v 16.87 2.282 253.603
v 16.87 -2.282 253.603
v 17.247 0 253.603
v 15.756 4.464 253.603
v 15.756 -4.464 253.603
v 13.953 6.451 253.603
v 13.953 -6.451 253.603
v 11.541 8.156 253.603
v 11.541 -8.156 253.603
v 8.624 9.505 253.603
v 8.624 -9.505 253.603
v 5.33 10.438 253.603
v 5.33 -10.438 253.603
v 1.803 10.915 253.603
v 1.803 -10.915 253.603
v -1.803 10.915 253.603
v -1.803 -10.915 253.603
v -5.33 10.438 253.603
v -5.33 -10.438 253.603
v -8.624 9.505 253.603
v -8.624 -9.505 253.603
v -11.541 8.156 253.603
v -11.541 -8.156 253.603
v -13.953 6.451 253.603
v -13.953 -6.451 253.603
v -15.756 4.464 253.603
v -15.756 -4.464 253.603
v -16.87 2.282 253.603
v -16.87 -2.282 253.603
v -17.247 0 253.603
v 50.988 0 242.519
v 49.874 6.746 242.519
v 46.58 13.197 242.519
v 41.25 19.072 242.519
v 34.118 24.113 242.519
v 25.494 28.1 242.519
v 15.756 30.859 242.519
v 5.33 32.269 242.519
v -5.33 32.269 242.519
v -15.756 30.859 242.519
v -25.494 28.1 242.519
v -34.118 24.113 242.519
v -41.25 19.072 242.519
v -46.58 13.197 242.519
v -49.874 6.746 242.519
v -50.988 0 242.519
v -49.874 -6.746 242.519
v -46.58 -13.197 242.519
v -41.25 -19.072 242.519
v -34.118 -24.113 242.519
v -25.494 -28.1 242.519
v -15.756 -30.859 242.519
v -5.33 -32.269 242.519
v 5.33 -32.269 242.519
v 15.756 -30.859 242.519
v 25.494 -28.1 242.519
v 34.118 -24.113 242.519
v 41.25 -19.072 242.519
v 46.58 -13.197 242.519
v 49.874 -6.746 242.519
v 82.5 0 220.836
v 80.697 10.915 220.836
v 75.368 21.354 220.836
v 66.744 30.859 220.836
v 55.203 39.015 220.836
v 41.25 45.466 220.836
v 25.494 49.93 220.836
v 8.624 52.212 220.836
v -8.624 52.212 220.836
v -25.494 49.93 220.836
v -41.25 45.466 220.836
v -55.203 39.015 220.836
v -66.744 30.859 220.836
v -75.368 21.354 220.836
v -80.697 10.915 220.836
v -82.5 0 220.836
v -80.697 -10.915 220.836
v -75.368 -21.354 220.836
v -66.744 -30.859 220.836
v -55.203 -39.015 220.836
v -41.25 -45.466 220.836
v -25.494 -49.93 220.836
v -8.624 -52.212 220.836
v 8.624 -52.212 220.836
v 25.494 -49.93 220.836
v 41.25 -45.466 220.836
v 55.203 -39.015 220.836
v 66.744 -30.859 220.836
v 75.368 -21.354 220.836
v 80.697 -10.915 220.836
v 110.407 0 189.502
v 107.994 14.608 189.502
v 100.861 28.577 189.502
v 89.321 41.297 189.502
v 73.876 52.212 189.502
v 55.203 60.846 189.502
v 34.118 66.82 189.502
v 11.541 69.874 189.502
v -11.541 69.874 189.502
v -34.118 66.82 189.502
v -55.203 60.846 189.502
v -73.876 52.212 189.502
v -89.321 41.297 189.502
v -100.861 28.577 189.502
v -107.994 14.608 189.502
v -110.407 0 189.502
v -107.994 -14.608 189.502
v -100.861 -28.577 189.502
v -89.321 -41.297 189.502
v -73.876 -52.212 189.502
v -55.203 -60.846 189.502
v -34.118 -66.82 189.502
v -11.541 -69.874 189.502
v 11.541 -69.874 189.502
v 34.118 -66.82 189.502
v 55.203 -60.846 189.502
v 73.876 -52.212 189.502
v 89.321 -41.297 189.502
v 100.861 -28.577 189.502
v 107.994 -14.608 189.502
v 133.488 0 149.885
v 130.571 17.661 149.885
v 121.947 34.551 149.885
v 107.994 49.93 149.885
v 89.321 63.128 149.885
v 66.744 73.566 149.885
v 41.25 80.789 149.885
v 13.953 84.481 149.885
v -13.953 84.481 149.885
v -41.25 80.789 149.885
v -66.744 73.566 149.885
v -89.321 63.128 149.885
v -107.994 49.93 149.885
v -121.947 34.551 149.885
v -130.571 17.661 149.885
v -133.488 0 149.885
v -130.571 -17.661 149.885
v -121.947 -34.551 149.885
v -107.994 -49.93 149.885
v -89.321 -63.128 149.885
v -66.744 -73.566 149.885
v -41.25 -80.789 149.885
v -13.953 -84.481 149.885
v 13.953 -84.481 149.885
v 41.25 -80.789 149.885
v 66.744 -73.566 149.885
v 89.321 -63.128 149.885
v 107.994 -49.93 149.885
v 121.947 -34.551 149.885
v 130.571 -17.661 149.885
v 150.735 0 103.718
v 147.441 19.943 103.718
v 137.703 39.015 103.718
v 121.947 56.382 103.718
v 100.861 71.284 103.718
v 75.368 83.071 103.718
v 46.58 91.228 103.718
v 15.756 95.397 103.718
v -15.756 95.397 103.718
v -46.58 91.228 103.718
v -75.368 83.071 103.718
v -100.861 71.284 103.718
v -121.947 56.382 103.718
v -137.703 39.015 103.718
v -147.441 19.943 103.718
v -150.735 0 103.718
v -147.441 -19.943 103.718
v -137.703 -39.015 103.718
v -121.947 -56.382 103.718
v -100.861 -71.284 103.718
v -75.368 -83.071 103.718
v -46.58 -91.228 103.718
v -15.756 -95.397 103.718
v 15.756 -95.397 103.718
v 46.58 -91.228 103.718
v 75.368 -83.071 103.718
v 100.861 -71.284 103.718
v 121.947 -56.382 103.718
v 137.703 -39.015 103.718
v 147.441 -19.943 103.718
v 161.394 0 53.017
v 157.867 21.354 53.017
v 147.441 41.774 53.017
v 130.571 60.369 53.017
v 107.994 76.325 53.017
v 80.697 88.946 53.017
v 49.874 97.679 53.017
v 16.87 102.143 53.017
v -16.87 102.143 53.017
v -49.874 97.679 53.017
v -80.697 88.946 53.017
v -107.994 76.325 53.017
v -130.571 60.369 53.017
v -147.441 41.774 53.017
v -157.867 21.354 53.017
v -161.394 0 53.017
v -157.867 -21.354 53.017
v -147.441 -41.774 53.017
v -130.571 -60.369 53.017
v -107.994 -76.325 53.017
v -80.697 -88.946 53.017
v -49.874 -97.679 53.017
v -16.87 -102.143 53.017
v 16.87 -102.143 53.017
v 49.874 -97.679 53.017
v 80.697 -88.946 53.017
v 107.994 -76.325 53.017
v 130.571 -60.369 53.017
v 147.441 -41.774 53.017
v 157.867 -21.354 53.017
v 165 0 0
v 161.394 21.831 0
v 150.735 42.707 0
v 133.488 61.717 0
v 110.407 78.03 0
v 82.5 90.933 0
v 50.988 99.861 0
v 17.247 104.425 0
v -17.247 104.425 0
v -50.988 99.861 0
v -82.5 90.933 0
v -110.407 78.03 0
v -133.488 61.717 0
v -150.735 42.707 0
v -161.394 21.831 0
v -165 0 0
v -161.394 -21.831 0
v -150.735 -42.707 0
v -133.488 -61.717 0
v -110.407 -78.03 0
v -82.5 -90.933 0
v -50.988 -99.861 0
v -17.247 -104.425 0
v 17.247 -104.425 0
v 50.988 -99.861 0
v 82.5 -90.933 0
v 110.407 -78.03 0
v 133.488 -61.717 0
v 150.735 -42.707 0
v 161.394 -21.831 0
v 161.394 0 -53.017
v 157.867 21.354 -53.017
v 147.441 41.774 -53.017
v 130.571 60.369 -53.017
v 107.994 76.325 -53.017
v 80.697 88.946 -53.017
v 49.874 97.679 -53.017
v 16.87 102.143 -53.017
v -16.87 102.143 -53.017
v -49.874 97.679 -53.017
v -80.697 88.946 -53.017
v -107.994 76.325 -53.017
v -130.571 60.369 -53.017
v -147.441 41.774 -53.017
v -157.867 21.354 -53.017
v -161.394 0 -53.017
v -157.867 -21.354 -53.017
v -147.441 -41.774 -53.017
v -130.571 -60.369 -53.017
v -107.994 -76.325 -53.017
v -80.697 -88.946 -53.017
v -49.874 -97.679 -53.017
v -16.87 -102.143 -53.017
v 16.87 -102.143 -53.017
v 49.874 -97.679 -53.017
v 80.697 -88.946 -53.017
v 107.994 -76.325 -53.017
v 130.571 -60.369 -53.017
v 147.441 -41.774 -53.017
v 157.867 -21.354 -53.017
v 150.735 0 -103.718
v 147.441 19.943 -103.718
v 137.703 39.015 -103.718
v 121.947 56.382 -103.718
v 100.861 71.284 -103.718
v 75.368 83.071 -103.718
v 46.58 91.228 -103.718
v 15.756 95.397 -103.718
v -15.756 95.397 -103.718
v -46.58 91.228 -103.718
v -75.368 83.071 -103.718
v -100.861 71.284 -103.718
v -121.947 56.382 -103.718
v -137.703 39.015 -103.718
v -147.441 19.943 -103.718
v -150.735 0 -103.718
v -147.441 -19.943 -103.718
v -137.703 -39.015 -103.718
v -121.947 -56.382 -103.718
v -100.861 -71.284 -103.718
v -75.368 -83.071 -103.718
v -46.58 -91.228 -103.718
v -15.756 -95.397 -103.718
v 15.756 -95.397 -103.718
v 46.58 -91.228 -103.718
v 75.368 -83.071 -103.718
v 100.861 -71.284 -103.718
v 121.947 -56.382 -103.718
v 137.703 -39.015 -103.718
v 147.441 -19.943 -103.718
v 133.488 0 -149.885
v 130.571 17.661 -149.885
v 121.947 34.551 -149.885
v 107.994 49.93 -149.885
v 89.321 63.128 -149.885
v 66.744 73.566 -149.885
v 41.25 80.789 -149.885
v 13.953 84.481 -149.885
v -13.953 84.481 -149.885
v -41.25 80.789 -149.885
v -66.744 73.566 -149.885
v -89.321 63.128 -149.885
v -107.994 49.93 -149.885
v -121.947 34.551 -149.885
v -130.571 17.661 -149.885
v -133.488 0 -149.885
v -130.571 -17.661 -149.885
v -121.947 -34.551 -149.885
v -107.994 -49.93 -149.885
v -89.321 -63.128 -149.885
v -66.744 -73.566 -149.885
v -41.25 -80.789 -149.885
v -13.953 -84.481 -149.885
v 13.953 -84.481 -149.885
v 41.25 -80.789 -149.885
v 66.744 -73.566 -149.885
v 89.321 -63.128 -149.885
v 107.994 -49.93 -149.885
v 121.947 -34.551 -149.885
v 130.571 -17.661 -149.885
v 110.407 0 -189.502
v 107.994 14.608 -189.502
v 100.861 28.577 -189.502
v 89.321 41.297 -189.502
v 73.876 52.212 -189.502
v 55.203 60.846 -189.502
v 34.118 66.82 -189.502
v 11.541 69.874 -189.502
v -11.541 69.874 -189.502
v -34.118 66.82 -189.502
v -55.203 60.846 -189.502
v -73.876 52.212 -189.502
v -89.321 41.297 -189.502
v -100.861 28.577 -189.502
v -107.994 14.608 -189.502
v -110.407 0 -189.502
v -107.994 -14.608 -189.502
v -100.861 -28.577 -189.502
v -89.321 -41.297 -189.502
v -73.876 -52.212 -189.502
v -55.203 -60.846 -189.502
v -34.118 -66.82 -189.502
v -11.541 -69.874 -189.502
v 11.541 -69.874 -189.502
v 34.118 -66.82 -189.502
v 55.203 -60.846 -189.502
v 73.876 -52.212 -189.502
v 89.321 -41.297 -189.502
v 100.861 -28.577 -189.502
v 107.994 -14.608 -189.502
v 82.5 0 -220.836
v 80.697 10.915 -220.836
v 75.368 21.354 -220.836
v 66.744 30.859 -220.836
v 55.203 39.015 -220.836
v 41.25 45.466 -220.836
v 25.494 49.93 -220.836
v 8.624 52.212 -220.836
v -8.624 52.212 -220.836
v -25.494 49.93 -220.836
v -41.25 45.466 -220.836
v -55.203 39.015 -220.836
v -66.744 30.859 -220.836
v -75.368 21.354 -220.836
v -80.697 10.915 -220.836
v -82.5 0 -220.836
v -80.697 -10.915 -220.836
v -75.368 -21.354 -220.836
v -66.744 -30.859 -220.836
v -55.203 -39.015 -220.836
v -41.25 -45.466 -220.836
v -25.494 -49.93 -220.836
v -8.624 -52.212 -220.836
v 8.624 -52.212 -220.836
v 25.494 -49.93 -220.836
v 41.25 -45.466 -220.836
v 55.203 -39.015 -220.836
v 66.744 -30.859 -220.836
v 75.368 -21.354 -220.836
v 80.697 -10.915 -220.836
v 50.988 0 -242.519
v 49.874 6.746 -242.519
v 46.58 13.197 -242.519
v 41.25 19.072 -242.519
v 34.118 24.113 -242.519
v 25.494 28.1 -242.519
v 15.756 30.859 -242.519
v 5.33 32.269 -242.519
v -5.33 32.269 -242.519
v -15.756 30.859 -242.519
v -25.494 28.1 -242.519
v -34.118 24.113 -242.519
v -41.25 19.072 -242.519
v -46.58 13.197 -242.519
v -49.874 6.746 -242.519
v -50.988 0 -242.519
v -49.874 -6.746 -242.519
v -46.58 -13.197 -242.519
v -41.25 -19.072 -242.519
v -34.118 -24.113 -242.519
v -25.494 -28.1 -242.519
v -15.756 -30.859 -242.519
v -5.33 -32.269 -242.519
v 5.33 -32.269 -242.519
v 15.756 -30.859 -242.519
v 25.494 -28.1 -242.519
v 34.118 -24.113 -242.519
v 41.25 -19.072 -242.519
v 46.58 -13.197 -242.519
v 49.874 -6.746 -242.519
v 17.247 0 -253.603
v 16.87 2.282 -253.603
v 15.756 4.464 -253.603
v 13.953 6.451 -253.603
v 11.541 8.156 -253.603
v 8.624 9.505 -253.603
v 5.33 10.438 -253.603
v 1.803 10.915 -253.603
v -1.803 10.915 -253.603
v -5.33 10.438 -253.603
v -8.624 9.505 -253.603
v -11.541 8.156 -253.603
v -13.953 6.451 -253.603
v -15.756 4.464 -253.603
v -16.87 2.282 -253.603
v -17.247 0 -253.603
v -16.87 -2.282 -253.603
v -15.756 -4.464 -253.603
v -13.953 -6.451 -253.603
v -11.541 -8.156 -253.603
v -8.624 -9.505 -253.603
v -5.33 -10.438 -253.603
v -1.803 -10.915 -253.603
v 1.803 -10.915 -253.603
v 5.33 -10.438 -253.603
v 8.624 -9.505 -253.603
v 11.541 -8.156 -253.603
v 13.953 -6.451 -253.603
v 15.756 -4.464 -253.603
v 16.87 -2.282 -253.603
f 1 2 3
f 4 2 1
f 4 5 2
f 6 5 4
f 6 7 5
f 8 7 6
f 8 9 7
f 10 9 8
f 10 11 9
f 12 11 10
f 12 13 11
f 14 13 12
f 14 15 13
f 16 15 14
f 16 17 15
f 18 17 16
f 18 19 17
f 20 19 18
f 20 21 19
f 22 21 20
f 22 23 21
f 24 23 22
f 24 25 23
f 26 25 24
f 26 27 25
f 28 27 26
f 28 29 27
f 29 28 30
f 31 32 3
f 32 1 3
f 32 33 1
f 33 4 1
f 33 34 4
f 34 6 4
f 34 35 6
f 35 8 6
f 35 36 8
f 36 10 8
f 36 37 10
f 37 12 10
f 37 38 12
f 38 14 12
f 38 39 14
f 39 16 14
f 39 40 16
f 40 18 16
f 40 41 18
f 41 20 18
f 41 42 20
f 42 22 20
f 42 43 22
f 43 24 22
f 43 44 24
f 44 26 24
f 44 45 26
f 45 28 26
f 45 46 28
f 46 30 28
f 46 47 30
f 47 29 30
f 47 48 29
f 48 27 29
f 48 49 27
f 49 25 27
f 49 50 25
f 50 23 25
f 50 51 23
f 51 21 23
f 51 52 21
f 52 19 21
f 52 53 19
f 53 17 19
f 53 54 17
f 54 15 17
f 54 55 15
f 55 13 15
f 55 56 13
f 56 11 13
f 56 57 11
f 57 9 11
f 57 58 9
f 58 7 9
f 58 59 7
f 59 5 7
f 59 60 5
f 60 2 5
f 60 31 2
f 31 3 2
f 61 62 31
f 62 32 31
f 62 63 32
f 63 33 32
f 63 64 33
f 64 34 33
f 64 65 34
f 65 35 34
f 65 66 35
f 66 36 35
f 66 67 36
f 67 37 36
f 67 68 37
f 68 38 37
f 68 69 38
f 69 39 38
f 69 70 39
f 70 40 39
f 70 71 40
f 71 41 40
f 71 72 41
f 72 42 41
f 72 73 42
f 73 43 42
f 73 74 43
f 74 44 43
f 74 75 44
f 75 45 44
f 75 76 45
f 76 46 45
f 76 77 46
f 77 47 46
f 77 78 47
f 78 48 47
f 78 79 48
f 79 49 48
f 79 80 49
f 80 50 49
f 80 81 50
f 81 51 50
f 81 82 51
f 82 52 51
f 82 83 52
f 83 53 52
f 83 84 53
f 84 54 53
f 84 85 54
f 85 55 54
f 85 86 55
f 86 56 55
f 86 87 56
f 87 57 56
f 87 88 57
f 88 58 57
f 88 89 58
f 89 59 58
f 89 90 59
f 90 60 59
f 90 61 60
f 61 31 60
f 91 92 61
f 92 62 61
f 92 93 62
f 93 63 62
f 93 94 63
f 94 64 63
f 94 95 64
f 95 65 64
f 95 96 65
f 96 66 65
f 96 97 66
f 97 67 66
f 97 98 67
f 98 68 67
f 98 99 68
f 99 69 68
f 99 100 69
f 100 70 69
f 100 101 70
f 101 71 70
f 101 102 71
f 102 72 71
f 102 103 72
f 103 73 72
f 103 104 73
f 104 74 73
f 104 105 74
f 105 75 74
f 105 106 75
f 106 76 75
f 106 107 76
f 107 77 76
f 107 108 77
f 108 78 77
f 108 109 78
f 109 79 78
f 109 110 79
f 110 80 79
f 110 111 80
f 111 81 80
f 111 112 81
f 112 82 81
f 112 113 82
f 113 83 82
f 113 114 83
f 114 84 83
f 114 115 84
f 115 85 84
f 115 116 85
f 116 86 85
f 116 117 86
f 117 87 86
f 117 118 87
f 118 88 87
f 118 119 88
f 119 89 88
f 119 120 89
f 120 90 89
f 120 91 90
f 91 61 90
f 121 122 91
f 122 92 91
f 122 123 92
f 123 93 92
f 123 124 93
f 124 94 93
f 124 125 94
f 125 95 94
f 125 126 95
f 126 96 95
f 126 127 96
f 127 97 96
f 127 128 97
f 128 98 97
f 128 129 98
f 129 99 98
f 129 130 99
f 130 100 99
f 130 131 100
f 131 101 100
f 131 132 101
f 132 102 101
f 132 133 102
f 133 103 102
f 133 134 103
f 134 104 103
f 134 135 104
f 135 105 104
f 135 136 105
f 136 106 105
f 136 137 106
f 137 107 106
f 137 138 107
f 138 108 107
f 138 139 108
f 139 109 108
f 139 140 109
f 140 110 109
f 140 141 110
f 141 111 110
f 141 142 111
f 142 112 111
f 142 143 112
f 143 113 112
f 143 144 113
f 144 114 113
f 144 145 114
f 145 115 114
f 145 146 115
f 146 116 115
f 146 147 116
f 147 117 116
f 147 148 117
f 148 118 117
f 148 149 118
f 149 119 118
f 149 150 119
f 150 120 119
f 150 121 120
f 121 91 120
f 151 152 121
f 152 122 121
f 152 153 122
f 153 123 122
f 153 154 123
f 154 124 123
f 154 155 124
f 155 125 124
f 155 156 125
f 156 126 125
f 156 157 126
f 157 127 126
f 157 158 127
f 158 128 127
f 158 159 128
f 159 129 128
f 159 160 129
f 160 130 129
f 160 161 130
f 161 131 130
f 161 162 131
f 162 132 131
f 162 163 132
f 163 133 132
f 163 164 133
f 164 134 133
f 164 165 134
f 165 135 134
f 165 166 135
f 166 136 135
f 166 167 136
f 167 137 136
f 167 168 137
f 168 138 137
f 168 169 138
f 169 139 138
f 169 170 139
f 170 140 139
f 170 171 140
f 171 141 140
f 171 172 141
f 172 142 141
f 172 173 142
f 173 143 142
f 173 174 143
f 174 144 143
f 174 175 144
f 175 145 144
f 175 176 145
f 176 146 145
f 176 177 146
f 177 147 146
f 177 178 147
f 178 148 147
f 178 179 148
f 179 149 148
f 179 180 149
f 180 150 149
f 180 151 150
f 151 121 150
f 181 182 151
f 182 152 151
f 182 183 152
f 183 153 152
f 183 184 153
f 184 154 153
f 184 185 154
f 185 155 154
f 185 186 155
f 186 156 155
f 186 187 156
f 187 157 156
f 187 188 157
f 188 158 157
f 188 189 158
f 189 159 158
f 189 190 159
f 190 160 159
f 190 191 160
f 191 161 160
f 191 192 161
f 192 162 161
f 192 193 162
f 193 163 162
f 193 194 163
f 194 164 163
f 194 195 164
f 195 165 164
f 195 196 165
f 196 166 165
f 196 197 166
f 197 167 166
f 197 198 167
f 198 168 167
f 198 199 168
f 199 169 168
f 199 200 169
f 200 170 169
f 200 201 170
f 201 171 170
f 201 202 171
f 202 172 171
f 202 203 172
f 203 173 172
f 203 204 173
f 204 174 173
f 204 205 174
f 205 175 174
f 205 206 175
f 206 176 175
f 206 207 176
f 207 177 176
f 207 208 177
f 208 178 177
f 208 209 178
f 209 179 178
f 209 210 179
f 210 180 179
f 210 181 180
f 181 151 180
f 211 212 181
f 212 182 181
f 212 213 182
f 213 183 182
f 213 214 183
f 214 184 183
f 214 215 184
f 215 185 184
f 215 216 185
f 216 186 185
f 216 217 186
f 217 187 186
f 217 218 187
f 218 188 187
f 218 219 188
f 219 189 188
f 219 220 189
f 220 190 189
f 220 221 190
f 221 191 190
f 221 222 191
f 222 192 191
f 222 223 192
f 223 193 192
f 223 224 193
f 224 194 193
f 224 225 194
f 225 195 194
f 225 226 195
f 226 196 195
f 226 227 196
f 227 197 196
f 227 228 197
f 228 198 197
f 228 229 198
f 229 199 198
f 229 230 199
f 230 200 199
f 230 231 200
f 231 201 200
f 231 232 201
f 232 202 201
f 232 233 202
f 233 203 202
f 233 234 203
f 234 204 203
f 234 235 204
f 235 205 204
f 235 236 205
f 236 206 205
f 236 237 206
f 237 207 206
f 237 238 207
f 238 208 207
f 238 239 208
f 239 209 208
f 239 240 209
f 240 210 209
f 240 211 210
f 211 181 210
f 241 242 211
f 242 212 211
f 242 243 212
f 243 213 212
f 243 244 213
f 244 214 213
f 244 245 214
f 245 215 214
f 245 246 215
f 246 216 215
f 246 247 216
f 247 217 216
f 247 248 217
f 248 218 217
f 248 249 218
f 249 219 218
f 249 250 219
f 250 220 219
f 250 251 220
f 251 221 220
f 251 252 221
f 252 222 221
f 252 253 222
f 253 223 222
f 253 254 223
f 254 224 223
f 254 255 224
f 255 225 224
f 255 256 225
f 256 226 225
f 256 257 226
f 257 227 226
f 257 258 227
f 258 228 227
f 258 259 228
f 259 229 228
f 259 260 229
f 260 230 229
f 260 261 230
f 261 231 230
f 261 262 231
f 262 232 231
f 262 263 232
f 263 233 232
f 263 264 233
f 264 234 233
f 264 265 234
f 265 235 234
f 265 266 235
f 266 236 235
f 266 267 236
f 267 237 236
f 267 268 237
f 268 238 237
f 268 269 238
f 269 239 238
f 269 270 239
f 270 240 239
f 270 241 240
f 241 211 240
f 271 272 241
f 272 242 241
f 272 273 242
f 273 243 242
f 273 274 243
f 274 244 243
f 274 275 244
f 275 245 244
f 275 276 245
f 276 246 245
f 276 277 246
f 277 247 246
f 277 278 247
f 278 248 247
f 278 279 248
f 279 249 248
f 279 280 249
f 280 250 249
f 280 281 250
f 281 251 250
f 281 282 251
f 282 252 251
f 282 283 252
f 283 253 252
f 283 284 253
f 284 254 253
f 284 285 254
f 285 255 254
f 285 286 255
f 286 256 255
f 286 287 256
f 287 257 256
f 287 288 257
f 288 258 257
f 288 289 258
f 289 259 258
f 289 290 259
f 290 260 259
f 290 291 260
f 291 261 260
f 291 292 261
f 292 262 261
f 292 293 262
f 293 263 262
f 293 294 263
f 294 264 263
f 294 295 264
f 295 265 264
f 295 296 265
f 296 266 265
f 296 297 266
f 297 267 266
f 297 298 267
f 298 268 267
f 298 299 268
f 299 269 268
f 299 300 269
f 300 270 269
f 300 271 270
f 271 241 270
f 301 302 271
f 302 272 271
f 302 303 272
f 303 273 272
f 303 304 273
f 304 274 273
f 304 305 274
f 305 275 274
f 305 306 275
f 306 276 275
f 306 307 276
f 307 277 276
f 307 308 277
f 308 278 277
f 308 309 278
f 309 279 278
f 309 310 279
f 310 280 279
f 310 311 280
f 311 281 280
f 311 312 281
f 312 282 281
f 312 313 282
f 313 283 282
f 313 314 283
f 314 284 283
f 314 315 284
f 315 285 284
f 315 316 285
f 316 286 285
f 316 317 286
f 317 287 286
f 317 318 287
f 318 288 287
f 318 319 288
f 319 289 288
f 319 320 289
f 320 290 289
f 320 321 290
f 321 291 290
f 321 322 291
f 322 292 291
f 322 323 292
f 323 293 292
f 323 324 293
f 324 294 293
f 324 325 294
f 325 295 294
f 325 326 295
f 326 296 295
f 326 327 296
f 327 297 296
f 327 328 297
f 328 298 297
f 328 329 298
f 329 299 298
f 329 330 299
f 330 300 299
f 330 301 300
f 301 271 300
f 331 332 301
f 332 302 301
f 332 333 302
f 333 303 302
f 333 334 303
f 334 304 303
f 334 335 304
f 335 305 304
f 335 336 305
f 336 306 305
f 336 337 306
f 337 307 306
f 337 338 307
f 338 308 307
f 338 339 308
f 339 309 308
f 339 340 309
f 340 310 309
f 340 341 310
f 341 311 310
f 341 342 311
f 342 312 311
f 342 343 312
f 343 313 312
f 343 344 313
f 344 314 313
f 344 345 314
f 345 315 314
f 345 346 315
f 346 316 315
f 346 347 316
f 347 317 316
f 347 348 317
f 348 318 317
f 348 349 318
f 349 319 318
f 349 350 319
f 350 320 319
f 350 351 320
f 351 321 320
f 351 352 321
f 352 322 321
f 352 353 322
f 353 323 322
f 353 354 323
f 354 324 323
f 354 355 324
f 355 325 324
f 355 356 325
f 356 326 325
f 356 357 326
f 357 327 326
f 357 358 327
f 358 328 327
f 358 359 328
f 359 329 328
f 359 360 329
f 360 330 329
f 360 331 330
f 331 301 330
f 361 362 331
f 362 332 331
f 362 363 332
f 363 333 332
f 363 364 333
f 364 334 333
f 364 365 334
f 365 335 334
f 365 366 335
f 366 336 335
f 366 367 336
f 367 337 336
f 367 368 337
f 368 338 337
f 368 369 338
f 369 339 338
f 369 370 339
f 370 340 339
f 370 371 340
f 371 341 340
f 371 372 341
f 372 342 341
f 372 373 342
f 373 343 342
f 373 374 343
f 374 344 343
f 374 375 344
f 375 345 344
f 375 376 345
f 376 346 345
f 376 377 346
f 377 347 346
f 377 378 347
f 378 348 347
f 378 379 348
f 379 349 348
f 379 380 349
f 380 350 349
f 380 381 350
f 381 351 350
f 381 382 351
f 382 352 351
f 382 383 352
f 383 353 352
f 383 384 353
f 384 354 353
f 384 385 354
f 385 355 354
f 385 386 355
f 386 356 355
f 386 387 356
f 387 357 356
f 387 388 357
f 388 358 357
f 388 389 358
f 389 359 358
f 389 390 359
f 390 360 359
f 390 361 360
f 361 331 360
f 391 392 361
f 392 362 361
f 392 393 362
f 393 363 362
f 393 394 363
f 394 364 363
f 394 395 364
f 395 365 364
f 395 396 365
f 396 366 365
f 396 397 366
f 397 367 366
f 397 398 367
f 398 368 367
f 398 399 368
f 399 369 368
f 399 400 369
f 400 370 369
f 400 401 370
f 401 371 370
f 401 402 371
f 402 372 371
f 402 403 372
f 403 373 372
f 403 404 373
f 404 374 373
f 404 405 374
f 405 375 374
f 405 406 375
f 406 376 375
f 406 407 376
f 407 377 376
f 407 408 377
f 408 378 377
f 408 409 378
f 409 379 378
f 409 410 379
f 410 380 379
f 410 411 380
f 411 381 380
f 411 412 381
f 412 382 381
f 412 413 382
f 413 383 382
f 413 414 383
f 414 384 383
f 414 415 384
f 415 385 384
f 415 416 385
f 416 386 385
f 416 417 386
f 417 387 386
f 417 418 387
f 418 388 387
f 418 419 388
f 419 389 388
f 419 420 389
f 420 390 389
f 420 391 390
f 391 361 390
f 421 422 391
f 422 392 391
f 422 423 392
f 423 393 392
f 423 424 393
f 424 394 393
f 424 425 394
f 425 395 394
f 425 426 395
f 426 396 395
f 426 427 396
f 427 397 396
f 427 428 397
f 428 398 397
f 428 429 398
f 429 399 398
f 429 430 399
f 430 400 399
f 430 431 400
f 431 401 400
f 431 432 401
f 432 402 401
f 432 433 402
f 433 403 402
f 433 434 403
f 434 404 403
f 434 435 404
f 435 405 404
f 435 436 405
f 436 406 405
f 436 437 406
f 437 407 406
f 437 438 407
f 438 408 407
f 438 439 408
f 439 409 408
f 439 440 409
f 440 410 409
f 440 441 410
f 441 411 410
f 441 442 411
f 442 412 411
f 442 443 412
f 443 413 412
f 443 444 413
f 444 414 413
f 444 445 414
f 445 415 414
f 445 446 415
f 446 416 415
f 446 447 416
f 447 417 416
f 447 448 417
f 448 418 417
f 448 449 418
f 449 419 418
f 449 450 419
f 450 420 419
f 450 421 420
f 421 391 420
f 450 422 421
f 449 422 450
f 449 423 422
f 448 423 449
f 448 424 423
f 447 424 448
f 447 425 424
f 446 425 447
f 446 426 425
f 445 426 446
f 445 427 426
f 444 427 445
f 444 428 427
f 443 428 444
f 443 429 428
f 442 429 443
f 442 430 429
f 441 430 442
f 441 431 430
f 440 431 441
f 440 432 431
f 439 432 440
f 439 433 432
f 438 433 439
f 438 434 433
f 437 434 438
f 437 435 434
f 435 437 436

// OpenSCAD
// Generated by SolidPython 1.0.1 on 2020-07-29 00:46:49


scale(v = [11, 7, 17]) {
	sphere(r = 15);
}
/***********************************************
*********      SolidPython code:      **********
************************************************
 
# import packages: SolidPython
from solid import *
from solid.utils import *
from itertools import chain, combinations, permutations


class Resize:

    def __init__(self, scad_file):
        self.scad_file = scad_file
        #self.scad_file = import_scad(scad_file)
        # cone/cylinder param:
        self.r1 = 0
        self.r2 = 0
        self.h = 0
        # rectangular prism param:
        self.w = 0
        self.l = 0
        # ellipse param:
        self.r = 0

    # import OpenScad code (file name corresponds to shape)


    # classify shape + parameters
    def assign(self, param1, param2, param3):
        if self.scad_file == 'cone.scad':
            self.r1 = param1
            self.r2 = param2
            self.h = param3
        elif self.scad_file == 'cylinder.scad':
            self.r1 = param1
            self.r2 = param2
            self.h = param3
        elif self.scad_file == 'rectangularPrism.scad':
            self.h = param1
            self.l = param2
            self.w = param3
        else:
            self.r = param1
            self.h = param2

    # resize parameters
    def iterate(self):
        x = range(3, 20, 2)
        i = 1
        if self.scad_file == 'cone.scad':
            tempList = list(permutations(x, 2))
            for temp in tempList:
                param1 = temp[0]
                param2 = temp[1]
                filepath = 'produced_scad_files/' + 'cone' + str(param1) + '_' + str(param2) + '_' + '.scad'
                scad_render_to_file(cylinder(h=param1, r1=param2, r2=0), filepath)

        elif self.scad_file == 'cylinder.scad':
            tempList = list(permutations(x, 3))
            for temp in tempList:
                param1 = temp[0]
                param2 = temp[1]
                filepath = 'produced_scad_files/' + 'cylinder' + str(param1) + '_' + str(param2) + '_' + '.scad'
                scad_render_to_file(cylinder(h=param1, r1=param2, r2=param2), filepath)

        elif self.scad_file == 'rectangularPrism.scad':
            tempList = list(permutations(x, 3))
            for temp in tempList:
                param1 = temp[0]
                param2 = temp[1]
                param3 = temp[2]
                filepath = 'produced_scad_files/' + 'rectangularPrism' + str(param1) + '_' + str(param2) + '_' + str(
                    param3) + '.scad'
                scad_render_to_file(cube(size=(param1, param2, param3)), filepath)

        elif self.scad_file == 'ellipse.scad':
            tempList = list(permutations(x, 4))
            for temp in tempList:
                param1 = temp[0]
                param2 = temp[1]
                param3 = temp[2]
                param4 = temp[3]
                filepath = 'produced_scad_files/' + 'ellipse' + str(param1) + '_' + str(param2) + '_' + str(param3) + '_' + str(param4) + '.scad'
                scad_render_to_file(scale([param1, param2, param3])(sphere(r=param4)), filepath)

    def render_to_scadfile(self):
        scad_render_to_file(scad, 'example.scad') 
 
************************************************/
